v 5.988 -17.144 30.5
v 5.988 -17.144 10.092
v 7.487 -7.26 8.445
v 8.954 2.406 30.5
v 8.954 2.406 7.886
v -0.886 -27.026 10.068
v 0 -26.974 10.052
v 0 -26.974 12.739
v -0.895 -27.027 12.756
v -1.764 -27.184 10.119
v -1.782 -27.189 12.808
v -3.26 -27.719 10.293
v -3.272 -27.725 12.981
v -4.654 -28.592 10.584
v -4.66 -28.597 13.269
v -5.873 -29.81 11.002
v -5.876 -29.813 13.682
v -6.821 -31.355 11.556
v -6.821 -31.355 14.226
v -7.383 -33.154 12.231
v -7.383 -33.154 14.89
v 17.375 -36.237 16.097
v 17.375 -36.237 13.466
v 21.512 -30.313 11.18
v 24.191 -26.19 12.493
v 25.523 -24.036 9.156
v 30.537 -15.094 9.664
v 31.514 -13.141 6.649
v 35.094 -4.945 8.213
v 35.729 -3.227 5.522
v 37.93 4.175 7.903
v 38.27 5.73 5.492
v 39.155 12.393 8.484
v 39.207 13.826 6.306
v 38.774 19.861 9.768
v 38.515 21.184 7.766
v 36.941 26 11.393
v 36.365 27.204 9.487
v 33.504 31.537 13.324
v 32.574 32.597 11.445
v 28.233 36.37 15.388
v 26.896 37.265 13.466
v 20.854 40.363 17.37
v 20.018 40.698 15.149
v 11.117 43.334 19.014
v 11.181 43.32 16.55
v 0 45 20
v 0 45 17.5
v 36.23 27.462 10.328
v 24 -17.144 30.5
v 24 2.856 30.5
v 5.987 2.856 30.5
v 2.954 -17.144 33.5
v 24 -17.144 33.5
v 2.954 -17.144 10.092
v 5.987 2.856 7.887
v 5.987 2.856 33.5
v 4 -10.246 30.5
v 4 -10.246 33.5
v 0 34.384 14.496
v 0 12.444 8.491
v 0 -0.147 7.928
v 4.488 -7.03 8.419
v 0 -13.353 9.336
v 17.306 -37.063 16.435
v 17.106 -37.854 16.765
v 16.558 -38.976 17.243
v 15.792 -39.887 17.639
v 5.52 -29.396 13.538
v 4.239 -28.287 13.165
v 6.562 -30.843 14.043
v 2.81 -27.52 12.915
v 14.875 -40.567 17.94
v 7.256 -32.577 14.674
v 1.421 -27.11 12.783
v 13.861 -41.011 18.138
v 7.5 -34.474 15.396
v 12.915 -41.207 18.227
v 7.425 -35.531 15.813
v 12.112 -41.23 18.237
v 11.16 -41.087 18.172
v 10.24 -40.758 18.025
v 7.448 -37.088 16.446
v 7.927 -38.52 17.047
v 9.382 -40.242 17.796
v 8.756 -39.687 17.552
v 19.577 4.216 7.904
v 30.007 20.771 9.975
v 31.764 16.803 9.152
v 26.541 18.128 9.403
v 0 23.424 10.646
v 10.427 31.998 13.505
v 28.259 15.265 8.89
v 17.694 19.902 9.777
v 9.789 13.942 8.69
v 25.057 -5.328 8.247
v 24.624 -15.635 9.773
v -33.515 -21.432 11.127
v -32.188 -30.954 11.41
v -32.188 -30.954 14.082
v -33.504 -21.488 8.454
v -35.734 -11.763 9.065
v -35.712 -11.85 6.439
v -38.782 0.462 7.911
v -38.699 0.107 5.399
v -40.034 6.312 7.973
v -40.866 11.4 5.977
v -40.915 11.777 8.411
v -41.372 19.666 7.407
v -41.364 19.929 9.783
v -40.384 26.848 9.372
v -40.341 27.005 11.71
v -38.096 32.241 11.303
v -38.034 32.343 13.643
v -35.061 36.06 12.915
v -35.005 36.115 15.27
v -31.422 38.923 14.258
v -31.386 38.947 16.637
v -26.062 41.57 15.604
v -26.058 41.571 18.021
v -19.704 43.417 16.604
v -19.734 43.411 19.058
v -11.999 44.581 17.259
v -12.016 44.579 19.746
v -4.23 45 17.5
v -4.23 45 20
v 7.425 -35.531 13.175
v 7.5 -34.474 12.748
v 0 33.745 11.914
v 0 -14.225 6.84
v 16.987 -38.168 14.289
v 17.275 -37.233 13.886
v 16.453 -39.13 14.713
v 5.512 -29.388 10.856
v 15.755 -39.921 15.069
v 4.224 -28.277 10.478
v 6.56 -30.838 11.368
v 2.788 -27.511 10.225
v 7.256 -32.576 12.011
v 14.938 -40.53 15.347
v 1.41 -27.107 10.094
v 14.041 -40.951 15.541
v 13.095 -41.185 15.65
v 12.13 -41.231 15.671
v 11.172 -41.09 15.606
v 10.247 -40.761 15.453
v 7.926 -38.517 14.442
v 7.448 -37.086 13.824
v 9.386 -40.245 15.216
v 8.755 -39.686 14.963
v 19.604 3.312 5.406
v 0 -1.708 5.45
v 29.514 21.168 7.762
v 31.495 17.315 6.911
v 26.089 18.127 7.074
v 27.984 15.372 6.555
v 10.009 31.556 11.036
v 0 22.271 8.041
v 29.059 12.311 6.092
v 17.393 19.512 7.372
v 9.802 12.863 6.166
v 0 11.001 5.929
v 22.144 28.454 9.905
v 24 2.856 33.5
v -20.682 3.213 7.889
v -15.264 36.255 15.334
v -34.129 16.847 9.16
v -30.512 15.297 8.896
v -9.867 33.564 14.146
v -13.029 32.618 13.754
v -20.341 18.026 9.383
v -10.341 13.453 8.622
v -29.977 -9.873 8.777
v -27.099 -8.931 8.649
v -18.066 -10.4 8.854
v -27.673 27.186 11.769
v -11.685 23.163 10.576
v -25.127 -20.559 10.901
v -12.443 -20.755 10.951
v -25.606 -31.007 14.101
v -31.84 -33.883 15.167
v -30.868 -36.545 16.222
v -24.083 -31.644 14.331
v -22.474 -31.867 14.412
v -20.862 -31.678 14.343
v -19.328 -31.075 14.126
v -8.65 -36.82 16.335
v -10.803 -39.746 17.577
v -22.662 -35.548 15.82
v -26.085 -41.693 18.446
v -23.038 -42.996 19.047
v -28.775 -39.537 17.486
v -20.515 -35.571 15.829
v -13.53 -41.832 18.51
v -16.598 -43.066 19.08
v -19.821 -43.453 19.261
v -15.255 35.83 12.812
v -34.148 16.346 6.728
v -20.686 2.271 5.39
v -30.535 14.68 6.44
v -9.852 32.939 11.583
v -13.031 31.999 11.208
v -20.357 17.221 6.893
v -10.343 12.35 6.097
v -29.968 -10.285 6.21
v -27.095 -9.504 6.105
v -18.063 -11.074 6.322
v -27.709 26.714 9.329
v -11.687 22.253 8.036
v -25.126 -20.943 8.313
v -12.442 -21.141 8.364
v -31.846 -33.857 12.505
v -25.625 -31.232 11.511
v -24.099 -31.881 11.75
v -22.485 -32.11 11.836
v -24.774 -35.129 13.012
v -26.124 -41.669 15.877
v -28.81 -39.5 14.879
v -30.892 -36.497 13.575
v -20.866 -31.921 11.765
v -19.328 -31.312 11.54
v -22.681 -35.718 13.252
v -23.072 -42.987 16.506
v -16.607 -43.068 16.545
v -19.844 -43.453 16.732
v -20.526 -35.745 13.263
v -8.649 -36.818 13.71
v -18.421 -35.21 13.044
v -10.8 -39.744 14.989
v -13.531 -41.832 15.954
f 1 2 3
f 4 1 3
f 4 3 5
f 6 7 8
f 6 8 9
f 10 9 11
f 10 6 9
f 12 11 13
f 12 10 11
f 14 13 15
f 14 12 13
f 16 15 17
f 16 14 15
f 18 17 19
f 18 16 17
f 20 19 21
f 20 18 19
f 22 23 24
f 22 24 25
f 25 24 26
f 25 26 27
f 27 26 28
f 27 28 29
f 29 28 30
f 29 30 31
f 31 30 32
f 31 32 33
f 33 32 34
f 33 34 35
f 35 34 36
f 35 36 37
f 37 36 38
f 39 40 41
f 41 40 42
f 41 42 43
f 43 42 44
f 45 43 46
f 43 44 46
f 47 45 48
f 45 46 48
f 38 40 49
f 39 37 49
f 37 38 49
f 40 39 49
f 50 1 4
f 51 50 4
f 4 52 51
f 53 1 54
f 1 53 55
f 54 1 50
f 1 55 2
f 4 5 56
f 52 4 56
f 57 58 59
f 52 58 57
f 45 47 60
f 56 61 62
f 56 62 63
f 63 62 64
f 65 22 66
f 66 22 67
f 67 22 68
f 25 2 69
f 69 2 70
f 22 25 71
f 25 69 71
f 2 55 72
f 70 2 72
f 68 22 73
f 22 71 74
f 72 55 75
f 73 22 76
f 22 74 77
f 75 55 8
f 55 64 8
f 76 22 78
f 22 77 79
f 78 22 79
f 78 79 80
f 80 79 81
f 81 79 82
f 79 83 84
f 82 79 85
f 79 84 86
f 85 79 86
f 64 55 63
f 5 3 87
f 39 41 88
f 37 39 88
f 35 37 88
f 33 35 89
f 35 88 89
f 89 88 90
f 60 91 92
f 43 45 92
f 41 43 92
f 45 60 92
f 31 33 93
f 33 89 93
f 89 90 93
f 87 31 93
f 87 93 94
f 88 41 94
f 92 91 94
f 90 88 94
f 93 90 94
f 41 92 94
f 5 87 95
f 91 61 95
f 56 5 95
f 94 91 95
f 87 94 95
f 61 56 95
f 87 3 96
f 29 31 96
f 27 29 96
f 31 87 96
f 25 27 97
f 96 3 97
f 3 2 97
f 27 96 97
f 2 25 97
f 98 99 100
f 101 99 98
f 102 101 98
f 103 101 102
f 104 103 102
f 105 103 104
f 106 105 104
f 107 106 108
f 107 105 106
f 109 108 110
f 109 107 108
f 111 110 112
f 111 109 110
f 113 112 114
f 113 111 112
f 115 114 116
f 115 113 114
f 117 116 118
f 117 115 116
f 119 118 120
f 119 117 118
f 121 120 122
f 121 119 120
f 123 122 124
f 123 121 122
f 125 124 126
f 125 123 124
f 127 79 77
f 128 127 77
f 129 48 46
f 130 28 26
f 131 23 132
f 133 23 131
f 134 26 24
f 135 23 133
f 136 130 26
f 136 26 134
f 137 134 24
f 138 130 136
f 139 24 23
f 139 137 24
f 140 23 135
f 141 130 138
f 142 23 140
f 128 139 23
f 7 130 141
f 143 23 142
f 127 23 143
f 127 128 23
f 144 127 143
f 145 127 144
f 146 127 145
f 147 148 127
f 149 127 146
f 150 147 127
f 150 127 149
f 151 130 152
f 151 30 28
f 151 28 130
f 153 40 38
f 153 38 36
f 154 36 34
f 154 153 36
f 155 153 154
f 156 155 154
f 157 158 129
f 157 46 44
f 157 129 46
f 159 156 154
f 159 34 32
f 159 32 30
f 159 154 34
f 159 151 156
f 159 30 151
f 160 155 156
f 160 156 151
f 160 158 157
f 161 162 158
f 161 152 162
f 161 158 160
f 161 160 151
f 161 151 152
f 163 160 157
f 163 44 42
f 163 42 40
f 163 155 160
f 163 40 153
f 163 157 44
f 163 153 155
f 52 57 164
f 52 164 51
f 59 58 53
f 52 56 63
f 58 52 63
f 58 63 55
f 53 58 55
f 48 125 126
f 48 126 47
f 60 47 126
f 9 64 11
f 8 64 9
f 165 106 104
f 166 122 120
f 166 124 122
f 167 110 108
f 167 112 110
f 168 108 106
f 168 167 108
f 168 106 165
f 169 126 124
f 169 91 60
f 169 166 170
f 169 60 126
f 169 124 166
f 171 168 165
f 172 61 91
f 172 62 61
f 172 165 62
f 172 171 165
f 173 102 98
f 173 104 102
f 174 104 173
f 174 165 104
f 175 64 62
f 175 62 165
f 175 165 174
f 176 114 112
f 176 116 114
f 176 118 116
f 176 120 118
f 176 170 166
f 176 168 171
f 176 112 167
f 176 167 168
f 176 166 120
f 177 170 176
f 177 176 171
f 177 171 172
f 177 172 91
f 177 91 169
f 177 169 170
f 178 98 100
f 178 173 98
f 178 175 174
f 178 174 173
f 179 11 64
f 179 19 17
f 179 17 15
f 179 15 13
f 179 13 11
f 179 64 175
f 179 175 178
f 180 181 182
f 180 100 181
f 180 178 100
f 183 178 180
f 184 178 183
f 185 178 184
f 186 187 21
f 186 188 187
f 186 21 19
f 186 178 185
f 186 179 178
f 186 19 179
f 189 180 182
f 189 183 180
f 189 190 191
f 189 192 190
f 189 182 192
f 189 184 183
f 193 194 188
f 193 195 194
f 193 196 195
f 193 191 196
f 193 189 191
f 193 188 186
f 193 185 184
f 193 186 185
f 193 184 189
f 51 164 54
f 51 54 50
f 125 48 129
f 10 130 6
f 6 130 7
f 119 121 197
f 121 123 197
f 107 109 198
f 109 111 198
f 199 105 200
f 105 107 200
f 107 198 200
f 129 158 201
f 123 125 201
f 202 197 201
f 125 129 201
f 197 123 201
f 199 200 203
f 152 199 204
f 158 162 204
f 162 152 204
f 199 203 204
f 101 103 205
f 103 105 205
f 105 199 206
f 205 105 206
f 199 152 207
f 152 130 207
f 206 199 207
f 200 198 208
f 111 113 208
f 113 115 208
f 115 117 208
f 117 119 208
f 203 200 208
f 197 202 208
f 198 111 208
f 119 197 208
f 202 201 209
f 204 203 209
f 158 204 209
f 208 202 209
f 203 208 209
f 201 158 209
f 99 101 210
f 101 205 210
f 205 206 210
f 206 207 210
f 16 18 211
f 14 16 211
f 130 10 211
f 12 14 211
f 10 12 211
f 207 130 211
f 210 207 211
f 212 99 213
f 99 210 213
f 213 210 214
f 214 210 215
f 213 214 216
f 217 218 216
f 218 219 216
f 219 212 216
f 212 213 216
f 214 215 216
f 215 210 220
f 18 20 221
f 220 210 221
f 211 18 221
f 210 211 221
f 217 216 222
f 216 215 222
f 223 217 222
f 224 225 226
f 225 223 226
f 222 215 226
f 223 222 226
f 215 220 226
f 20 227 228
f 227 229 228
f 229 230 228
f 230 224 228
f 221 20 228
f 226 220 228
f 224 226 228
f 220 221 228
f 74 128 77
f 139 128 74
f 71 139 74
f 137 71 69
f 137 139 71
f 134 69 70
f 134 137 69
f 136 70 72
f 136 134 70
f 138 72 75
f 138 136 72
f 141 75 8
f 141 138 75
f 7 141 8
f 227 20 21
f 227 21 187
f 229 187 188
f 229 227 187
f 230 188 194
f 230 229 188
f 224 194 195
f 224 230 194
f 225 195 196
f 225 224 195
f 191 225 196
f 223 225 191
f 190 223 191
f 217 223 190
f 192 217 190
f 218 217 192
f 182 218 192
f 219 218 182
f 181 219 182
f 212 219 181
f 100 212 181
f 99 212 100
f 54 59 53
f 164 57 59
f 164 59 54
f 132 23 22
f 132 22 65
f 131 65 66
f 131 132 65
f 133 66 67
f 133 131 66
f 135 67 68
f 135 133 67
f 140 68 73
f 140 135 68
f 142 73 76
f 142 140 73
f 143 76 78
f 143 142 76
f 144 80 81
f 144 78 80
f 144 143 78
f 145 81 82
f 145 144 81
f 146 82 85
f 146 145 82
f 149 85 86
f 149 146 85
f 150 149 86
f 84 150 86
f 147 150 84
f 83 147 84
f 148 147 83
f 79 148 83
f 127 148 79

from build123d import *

# Parameters (mm, degrees)
SKETCH2_W               = 90
SKETCH2_H               = 90
BOSS_EXTRUDE1_DEPTH     = 20
CUT_EXTRUDE1_DEPTH      = 67.708320321
CUT_EXTRUDE1_DEPTH_BACK = 67.708320321
CUT_EXTRUDE2_DEPTH      = 67.708320486
CUT_EXTRUDE2_DEPTH_BACK = 67.708320486
BOSS_EXTRUDE2_START     = 7.5
BOSS_EXTRUDE2_DEPTH     = 26
BOSS_EXTRUDE3_START     = 4
SKETCH6_W               = 3
SKETCH6_H               = 20
BOSS_EXTRUDE3_DEPTH     = 20
CUT_EXTRUDE3_START      = 30
CUT_EXTRUDE3_DEPTH      = 10


with BuildPart() as part:
    # Sketch2 → Boss-Extrude1 (new body)
    with BuildSketch(Plane.XY):
        Rectangle(SKETCH2_W, SKETCH2_H)
    extrude(amount=BOSS_EXTRUDE1_DEPTH)

    # Sketch3 → Cut-Extrude1 (cut, two sides)
    with BuildSketch(Plane(origin=(0, 0, 0), x_dir=(0, 0, -1), z_dir=(1, 0, 0))) as cut_extrude1_sk:
        with BuildLine():
            Line((0, -45), (0, 45))
            Line((0, 45), (-17.5, 45))
            add(Edge.make_bspline(
                [(-17.5, 45), (6.726056833, 3.093816892), (-17.5, -45)],
                knots=[0, 0, 0, 1, 1, 1], degree=2))
            Line((-17.5, -45), (0, -45))
        make_face()
        with BuildLine():
            add(Edge.make_bspline(
                [(-20, 45), (4.227639313, 5.03468062), (-20, -45)],
                knots=[0, 0, 0, 1, 1, 1], degree=2))
            Line((-20, -45), (-20, 45))
        make_face()
    extrude(amount=CUT_EXTRUDE1_DEPTH, mode=Mode.SUBTRACT)
    extrude(cut_extrude1_sk.sketch, amount=-CUT_EXTRUDE1_DEPTH_BACK, mode=Mode.SUBTRACT)

    # Sketch4 → Cut-Extrude2 (cut, two sides)
    with BuildSketch(Plane.XY) as cut_extrude2_sk:
        with BuildLine():
            Line((0, -41.973736842), (0, -45))
            Line((0, -45), (45, -45))
            Line((45, -45), (45, 45))
            Line((45, 45), (0, 45))
            add(Edge.make_bspline(
                [(17.375058461, -36.236668515), (37.115061452, -9.091765806), (61.513002786, 39.355563534), (0, 45)],
                knots=[0, 0, 0, 0, 1, 1, 1, 1], degree=3))
            ThreePointArc((17.375058461, -36.236668515), (12.021587761, -41.224158712), (7.425035075, -35.531495855))
            ThreePointArc((7.425035075, -35.531495855), (4.915119907, -40.138681352), (0, -41.973736842))
        make_face()
        with BuildLine():
            Line((-45, -45), (0, -45))
            Line((0, -45), (0, -41.973736842))
            ThreePointArc((0, -41.973736842), (-5.751088308, -39.287777066), (-7.382925452, -33.153732383))
            ThreePointArc((-7.382925452, -33.153732383), (-20.792123146, -43.404847745), (-32.187801105, -30.953724389))
            add(Edge.make_bspline(
                [(-32.187801105, -30.953724389), (-34.107884409, -0.978450852), (-64.097466043, 43.988968502), (-4.230485268, 45)],
                knots=[0, 0, 0, 0, 0.977737851, 0.977737851, 0.977737851, 0.977737851], degree=3))
            Line((-4.230485268, 45), (-45, 45))
            Line((-45, 45), (-45, -45))
        make_face()
        with BuildLine():
            ThreePointArc((-7.382925452, -33.153732383), (-5.751088308, -39.287777066), (0, -41.973736842))
            Line((0, -41.973736842), (0, -26.973736842))
            ThreePointArc((0, -26.973736842), (-4.814040224, -28.722648535), (-7.382925452, -33.153732383))
        make_face()
        with BuildLine():
            Line((0, -26.973736842), (0, -41.973736842))
            ThreePointArc((0, -41.973736842), (4.915119907, -40.138681352), (7.425035075, -35.531495855))
            ThreePointArc((7.425035075, -35.531495855), (7.481235295, -35.003942903), (7.5, -34.473736842))
            ThreePointArc((7.5, -34.473736842), (5.303300859, -29.170435983), (0, -26.973736842))
        make_face()
    extrude(amount=CUT_EXTRUDE2_DEPTH, mode=Mode.SUBTRACT)
    extrude(cut_extrude2_sk.sketch, amount=-CUT_EXTRUDE2_DEPTH_BACK, mode=Mode.SUBTRACT)

    # Sketch5 → Boss-Extrude2 (add)
    with BuildSketch(Plane.XY.offset(BOSS_EXTRUDE2_START)):
        Polygon((5.987927079, -17.143883964), (8.953511265, 2.40618792), (5.98744237, 2.856116036), (2.953607811, -17.143883964), align=None)
    extrude(amount=BOSS_EXTRUDE2_DEPTH)

    # Sketch6 → Boss-Extrude3 (add)
    with BuildSketch(Plane(origin=(0, 0, 0), x_dir=(0, 0, -1), z_dir=(1, 0, 0)).offset(BOSS_EXTRUDE3_START)):
        with Locations((-32, -7.143883964)):
            Rectangle(SKETCH6_W, SKETCH6_H)
    extrude(amount=BOSS_EXTRUDE3_DEPTH)

    # Sketch7 → Cut-Extrude3 (cut)
    with BuildSketch(Plane.XY.offset(CUT_EXTRUDE3_START)):
        Polygon((4, -10.245734651), (5.98744237, 2.856116036), (3.019616762, 2.856116036), (3.582073592, -13.000838136), align=None)
    extrude(amount=CUT_EXTRUDE3_DEPTH, mode=Mode.SUBTRACT)


solid = part.part
